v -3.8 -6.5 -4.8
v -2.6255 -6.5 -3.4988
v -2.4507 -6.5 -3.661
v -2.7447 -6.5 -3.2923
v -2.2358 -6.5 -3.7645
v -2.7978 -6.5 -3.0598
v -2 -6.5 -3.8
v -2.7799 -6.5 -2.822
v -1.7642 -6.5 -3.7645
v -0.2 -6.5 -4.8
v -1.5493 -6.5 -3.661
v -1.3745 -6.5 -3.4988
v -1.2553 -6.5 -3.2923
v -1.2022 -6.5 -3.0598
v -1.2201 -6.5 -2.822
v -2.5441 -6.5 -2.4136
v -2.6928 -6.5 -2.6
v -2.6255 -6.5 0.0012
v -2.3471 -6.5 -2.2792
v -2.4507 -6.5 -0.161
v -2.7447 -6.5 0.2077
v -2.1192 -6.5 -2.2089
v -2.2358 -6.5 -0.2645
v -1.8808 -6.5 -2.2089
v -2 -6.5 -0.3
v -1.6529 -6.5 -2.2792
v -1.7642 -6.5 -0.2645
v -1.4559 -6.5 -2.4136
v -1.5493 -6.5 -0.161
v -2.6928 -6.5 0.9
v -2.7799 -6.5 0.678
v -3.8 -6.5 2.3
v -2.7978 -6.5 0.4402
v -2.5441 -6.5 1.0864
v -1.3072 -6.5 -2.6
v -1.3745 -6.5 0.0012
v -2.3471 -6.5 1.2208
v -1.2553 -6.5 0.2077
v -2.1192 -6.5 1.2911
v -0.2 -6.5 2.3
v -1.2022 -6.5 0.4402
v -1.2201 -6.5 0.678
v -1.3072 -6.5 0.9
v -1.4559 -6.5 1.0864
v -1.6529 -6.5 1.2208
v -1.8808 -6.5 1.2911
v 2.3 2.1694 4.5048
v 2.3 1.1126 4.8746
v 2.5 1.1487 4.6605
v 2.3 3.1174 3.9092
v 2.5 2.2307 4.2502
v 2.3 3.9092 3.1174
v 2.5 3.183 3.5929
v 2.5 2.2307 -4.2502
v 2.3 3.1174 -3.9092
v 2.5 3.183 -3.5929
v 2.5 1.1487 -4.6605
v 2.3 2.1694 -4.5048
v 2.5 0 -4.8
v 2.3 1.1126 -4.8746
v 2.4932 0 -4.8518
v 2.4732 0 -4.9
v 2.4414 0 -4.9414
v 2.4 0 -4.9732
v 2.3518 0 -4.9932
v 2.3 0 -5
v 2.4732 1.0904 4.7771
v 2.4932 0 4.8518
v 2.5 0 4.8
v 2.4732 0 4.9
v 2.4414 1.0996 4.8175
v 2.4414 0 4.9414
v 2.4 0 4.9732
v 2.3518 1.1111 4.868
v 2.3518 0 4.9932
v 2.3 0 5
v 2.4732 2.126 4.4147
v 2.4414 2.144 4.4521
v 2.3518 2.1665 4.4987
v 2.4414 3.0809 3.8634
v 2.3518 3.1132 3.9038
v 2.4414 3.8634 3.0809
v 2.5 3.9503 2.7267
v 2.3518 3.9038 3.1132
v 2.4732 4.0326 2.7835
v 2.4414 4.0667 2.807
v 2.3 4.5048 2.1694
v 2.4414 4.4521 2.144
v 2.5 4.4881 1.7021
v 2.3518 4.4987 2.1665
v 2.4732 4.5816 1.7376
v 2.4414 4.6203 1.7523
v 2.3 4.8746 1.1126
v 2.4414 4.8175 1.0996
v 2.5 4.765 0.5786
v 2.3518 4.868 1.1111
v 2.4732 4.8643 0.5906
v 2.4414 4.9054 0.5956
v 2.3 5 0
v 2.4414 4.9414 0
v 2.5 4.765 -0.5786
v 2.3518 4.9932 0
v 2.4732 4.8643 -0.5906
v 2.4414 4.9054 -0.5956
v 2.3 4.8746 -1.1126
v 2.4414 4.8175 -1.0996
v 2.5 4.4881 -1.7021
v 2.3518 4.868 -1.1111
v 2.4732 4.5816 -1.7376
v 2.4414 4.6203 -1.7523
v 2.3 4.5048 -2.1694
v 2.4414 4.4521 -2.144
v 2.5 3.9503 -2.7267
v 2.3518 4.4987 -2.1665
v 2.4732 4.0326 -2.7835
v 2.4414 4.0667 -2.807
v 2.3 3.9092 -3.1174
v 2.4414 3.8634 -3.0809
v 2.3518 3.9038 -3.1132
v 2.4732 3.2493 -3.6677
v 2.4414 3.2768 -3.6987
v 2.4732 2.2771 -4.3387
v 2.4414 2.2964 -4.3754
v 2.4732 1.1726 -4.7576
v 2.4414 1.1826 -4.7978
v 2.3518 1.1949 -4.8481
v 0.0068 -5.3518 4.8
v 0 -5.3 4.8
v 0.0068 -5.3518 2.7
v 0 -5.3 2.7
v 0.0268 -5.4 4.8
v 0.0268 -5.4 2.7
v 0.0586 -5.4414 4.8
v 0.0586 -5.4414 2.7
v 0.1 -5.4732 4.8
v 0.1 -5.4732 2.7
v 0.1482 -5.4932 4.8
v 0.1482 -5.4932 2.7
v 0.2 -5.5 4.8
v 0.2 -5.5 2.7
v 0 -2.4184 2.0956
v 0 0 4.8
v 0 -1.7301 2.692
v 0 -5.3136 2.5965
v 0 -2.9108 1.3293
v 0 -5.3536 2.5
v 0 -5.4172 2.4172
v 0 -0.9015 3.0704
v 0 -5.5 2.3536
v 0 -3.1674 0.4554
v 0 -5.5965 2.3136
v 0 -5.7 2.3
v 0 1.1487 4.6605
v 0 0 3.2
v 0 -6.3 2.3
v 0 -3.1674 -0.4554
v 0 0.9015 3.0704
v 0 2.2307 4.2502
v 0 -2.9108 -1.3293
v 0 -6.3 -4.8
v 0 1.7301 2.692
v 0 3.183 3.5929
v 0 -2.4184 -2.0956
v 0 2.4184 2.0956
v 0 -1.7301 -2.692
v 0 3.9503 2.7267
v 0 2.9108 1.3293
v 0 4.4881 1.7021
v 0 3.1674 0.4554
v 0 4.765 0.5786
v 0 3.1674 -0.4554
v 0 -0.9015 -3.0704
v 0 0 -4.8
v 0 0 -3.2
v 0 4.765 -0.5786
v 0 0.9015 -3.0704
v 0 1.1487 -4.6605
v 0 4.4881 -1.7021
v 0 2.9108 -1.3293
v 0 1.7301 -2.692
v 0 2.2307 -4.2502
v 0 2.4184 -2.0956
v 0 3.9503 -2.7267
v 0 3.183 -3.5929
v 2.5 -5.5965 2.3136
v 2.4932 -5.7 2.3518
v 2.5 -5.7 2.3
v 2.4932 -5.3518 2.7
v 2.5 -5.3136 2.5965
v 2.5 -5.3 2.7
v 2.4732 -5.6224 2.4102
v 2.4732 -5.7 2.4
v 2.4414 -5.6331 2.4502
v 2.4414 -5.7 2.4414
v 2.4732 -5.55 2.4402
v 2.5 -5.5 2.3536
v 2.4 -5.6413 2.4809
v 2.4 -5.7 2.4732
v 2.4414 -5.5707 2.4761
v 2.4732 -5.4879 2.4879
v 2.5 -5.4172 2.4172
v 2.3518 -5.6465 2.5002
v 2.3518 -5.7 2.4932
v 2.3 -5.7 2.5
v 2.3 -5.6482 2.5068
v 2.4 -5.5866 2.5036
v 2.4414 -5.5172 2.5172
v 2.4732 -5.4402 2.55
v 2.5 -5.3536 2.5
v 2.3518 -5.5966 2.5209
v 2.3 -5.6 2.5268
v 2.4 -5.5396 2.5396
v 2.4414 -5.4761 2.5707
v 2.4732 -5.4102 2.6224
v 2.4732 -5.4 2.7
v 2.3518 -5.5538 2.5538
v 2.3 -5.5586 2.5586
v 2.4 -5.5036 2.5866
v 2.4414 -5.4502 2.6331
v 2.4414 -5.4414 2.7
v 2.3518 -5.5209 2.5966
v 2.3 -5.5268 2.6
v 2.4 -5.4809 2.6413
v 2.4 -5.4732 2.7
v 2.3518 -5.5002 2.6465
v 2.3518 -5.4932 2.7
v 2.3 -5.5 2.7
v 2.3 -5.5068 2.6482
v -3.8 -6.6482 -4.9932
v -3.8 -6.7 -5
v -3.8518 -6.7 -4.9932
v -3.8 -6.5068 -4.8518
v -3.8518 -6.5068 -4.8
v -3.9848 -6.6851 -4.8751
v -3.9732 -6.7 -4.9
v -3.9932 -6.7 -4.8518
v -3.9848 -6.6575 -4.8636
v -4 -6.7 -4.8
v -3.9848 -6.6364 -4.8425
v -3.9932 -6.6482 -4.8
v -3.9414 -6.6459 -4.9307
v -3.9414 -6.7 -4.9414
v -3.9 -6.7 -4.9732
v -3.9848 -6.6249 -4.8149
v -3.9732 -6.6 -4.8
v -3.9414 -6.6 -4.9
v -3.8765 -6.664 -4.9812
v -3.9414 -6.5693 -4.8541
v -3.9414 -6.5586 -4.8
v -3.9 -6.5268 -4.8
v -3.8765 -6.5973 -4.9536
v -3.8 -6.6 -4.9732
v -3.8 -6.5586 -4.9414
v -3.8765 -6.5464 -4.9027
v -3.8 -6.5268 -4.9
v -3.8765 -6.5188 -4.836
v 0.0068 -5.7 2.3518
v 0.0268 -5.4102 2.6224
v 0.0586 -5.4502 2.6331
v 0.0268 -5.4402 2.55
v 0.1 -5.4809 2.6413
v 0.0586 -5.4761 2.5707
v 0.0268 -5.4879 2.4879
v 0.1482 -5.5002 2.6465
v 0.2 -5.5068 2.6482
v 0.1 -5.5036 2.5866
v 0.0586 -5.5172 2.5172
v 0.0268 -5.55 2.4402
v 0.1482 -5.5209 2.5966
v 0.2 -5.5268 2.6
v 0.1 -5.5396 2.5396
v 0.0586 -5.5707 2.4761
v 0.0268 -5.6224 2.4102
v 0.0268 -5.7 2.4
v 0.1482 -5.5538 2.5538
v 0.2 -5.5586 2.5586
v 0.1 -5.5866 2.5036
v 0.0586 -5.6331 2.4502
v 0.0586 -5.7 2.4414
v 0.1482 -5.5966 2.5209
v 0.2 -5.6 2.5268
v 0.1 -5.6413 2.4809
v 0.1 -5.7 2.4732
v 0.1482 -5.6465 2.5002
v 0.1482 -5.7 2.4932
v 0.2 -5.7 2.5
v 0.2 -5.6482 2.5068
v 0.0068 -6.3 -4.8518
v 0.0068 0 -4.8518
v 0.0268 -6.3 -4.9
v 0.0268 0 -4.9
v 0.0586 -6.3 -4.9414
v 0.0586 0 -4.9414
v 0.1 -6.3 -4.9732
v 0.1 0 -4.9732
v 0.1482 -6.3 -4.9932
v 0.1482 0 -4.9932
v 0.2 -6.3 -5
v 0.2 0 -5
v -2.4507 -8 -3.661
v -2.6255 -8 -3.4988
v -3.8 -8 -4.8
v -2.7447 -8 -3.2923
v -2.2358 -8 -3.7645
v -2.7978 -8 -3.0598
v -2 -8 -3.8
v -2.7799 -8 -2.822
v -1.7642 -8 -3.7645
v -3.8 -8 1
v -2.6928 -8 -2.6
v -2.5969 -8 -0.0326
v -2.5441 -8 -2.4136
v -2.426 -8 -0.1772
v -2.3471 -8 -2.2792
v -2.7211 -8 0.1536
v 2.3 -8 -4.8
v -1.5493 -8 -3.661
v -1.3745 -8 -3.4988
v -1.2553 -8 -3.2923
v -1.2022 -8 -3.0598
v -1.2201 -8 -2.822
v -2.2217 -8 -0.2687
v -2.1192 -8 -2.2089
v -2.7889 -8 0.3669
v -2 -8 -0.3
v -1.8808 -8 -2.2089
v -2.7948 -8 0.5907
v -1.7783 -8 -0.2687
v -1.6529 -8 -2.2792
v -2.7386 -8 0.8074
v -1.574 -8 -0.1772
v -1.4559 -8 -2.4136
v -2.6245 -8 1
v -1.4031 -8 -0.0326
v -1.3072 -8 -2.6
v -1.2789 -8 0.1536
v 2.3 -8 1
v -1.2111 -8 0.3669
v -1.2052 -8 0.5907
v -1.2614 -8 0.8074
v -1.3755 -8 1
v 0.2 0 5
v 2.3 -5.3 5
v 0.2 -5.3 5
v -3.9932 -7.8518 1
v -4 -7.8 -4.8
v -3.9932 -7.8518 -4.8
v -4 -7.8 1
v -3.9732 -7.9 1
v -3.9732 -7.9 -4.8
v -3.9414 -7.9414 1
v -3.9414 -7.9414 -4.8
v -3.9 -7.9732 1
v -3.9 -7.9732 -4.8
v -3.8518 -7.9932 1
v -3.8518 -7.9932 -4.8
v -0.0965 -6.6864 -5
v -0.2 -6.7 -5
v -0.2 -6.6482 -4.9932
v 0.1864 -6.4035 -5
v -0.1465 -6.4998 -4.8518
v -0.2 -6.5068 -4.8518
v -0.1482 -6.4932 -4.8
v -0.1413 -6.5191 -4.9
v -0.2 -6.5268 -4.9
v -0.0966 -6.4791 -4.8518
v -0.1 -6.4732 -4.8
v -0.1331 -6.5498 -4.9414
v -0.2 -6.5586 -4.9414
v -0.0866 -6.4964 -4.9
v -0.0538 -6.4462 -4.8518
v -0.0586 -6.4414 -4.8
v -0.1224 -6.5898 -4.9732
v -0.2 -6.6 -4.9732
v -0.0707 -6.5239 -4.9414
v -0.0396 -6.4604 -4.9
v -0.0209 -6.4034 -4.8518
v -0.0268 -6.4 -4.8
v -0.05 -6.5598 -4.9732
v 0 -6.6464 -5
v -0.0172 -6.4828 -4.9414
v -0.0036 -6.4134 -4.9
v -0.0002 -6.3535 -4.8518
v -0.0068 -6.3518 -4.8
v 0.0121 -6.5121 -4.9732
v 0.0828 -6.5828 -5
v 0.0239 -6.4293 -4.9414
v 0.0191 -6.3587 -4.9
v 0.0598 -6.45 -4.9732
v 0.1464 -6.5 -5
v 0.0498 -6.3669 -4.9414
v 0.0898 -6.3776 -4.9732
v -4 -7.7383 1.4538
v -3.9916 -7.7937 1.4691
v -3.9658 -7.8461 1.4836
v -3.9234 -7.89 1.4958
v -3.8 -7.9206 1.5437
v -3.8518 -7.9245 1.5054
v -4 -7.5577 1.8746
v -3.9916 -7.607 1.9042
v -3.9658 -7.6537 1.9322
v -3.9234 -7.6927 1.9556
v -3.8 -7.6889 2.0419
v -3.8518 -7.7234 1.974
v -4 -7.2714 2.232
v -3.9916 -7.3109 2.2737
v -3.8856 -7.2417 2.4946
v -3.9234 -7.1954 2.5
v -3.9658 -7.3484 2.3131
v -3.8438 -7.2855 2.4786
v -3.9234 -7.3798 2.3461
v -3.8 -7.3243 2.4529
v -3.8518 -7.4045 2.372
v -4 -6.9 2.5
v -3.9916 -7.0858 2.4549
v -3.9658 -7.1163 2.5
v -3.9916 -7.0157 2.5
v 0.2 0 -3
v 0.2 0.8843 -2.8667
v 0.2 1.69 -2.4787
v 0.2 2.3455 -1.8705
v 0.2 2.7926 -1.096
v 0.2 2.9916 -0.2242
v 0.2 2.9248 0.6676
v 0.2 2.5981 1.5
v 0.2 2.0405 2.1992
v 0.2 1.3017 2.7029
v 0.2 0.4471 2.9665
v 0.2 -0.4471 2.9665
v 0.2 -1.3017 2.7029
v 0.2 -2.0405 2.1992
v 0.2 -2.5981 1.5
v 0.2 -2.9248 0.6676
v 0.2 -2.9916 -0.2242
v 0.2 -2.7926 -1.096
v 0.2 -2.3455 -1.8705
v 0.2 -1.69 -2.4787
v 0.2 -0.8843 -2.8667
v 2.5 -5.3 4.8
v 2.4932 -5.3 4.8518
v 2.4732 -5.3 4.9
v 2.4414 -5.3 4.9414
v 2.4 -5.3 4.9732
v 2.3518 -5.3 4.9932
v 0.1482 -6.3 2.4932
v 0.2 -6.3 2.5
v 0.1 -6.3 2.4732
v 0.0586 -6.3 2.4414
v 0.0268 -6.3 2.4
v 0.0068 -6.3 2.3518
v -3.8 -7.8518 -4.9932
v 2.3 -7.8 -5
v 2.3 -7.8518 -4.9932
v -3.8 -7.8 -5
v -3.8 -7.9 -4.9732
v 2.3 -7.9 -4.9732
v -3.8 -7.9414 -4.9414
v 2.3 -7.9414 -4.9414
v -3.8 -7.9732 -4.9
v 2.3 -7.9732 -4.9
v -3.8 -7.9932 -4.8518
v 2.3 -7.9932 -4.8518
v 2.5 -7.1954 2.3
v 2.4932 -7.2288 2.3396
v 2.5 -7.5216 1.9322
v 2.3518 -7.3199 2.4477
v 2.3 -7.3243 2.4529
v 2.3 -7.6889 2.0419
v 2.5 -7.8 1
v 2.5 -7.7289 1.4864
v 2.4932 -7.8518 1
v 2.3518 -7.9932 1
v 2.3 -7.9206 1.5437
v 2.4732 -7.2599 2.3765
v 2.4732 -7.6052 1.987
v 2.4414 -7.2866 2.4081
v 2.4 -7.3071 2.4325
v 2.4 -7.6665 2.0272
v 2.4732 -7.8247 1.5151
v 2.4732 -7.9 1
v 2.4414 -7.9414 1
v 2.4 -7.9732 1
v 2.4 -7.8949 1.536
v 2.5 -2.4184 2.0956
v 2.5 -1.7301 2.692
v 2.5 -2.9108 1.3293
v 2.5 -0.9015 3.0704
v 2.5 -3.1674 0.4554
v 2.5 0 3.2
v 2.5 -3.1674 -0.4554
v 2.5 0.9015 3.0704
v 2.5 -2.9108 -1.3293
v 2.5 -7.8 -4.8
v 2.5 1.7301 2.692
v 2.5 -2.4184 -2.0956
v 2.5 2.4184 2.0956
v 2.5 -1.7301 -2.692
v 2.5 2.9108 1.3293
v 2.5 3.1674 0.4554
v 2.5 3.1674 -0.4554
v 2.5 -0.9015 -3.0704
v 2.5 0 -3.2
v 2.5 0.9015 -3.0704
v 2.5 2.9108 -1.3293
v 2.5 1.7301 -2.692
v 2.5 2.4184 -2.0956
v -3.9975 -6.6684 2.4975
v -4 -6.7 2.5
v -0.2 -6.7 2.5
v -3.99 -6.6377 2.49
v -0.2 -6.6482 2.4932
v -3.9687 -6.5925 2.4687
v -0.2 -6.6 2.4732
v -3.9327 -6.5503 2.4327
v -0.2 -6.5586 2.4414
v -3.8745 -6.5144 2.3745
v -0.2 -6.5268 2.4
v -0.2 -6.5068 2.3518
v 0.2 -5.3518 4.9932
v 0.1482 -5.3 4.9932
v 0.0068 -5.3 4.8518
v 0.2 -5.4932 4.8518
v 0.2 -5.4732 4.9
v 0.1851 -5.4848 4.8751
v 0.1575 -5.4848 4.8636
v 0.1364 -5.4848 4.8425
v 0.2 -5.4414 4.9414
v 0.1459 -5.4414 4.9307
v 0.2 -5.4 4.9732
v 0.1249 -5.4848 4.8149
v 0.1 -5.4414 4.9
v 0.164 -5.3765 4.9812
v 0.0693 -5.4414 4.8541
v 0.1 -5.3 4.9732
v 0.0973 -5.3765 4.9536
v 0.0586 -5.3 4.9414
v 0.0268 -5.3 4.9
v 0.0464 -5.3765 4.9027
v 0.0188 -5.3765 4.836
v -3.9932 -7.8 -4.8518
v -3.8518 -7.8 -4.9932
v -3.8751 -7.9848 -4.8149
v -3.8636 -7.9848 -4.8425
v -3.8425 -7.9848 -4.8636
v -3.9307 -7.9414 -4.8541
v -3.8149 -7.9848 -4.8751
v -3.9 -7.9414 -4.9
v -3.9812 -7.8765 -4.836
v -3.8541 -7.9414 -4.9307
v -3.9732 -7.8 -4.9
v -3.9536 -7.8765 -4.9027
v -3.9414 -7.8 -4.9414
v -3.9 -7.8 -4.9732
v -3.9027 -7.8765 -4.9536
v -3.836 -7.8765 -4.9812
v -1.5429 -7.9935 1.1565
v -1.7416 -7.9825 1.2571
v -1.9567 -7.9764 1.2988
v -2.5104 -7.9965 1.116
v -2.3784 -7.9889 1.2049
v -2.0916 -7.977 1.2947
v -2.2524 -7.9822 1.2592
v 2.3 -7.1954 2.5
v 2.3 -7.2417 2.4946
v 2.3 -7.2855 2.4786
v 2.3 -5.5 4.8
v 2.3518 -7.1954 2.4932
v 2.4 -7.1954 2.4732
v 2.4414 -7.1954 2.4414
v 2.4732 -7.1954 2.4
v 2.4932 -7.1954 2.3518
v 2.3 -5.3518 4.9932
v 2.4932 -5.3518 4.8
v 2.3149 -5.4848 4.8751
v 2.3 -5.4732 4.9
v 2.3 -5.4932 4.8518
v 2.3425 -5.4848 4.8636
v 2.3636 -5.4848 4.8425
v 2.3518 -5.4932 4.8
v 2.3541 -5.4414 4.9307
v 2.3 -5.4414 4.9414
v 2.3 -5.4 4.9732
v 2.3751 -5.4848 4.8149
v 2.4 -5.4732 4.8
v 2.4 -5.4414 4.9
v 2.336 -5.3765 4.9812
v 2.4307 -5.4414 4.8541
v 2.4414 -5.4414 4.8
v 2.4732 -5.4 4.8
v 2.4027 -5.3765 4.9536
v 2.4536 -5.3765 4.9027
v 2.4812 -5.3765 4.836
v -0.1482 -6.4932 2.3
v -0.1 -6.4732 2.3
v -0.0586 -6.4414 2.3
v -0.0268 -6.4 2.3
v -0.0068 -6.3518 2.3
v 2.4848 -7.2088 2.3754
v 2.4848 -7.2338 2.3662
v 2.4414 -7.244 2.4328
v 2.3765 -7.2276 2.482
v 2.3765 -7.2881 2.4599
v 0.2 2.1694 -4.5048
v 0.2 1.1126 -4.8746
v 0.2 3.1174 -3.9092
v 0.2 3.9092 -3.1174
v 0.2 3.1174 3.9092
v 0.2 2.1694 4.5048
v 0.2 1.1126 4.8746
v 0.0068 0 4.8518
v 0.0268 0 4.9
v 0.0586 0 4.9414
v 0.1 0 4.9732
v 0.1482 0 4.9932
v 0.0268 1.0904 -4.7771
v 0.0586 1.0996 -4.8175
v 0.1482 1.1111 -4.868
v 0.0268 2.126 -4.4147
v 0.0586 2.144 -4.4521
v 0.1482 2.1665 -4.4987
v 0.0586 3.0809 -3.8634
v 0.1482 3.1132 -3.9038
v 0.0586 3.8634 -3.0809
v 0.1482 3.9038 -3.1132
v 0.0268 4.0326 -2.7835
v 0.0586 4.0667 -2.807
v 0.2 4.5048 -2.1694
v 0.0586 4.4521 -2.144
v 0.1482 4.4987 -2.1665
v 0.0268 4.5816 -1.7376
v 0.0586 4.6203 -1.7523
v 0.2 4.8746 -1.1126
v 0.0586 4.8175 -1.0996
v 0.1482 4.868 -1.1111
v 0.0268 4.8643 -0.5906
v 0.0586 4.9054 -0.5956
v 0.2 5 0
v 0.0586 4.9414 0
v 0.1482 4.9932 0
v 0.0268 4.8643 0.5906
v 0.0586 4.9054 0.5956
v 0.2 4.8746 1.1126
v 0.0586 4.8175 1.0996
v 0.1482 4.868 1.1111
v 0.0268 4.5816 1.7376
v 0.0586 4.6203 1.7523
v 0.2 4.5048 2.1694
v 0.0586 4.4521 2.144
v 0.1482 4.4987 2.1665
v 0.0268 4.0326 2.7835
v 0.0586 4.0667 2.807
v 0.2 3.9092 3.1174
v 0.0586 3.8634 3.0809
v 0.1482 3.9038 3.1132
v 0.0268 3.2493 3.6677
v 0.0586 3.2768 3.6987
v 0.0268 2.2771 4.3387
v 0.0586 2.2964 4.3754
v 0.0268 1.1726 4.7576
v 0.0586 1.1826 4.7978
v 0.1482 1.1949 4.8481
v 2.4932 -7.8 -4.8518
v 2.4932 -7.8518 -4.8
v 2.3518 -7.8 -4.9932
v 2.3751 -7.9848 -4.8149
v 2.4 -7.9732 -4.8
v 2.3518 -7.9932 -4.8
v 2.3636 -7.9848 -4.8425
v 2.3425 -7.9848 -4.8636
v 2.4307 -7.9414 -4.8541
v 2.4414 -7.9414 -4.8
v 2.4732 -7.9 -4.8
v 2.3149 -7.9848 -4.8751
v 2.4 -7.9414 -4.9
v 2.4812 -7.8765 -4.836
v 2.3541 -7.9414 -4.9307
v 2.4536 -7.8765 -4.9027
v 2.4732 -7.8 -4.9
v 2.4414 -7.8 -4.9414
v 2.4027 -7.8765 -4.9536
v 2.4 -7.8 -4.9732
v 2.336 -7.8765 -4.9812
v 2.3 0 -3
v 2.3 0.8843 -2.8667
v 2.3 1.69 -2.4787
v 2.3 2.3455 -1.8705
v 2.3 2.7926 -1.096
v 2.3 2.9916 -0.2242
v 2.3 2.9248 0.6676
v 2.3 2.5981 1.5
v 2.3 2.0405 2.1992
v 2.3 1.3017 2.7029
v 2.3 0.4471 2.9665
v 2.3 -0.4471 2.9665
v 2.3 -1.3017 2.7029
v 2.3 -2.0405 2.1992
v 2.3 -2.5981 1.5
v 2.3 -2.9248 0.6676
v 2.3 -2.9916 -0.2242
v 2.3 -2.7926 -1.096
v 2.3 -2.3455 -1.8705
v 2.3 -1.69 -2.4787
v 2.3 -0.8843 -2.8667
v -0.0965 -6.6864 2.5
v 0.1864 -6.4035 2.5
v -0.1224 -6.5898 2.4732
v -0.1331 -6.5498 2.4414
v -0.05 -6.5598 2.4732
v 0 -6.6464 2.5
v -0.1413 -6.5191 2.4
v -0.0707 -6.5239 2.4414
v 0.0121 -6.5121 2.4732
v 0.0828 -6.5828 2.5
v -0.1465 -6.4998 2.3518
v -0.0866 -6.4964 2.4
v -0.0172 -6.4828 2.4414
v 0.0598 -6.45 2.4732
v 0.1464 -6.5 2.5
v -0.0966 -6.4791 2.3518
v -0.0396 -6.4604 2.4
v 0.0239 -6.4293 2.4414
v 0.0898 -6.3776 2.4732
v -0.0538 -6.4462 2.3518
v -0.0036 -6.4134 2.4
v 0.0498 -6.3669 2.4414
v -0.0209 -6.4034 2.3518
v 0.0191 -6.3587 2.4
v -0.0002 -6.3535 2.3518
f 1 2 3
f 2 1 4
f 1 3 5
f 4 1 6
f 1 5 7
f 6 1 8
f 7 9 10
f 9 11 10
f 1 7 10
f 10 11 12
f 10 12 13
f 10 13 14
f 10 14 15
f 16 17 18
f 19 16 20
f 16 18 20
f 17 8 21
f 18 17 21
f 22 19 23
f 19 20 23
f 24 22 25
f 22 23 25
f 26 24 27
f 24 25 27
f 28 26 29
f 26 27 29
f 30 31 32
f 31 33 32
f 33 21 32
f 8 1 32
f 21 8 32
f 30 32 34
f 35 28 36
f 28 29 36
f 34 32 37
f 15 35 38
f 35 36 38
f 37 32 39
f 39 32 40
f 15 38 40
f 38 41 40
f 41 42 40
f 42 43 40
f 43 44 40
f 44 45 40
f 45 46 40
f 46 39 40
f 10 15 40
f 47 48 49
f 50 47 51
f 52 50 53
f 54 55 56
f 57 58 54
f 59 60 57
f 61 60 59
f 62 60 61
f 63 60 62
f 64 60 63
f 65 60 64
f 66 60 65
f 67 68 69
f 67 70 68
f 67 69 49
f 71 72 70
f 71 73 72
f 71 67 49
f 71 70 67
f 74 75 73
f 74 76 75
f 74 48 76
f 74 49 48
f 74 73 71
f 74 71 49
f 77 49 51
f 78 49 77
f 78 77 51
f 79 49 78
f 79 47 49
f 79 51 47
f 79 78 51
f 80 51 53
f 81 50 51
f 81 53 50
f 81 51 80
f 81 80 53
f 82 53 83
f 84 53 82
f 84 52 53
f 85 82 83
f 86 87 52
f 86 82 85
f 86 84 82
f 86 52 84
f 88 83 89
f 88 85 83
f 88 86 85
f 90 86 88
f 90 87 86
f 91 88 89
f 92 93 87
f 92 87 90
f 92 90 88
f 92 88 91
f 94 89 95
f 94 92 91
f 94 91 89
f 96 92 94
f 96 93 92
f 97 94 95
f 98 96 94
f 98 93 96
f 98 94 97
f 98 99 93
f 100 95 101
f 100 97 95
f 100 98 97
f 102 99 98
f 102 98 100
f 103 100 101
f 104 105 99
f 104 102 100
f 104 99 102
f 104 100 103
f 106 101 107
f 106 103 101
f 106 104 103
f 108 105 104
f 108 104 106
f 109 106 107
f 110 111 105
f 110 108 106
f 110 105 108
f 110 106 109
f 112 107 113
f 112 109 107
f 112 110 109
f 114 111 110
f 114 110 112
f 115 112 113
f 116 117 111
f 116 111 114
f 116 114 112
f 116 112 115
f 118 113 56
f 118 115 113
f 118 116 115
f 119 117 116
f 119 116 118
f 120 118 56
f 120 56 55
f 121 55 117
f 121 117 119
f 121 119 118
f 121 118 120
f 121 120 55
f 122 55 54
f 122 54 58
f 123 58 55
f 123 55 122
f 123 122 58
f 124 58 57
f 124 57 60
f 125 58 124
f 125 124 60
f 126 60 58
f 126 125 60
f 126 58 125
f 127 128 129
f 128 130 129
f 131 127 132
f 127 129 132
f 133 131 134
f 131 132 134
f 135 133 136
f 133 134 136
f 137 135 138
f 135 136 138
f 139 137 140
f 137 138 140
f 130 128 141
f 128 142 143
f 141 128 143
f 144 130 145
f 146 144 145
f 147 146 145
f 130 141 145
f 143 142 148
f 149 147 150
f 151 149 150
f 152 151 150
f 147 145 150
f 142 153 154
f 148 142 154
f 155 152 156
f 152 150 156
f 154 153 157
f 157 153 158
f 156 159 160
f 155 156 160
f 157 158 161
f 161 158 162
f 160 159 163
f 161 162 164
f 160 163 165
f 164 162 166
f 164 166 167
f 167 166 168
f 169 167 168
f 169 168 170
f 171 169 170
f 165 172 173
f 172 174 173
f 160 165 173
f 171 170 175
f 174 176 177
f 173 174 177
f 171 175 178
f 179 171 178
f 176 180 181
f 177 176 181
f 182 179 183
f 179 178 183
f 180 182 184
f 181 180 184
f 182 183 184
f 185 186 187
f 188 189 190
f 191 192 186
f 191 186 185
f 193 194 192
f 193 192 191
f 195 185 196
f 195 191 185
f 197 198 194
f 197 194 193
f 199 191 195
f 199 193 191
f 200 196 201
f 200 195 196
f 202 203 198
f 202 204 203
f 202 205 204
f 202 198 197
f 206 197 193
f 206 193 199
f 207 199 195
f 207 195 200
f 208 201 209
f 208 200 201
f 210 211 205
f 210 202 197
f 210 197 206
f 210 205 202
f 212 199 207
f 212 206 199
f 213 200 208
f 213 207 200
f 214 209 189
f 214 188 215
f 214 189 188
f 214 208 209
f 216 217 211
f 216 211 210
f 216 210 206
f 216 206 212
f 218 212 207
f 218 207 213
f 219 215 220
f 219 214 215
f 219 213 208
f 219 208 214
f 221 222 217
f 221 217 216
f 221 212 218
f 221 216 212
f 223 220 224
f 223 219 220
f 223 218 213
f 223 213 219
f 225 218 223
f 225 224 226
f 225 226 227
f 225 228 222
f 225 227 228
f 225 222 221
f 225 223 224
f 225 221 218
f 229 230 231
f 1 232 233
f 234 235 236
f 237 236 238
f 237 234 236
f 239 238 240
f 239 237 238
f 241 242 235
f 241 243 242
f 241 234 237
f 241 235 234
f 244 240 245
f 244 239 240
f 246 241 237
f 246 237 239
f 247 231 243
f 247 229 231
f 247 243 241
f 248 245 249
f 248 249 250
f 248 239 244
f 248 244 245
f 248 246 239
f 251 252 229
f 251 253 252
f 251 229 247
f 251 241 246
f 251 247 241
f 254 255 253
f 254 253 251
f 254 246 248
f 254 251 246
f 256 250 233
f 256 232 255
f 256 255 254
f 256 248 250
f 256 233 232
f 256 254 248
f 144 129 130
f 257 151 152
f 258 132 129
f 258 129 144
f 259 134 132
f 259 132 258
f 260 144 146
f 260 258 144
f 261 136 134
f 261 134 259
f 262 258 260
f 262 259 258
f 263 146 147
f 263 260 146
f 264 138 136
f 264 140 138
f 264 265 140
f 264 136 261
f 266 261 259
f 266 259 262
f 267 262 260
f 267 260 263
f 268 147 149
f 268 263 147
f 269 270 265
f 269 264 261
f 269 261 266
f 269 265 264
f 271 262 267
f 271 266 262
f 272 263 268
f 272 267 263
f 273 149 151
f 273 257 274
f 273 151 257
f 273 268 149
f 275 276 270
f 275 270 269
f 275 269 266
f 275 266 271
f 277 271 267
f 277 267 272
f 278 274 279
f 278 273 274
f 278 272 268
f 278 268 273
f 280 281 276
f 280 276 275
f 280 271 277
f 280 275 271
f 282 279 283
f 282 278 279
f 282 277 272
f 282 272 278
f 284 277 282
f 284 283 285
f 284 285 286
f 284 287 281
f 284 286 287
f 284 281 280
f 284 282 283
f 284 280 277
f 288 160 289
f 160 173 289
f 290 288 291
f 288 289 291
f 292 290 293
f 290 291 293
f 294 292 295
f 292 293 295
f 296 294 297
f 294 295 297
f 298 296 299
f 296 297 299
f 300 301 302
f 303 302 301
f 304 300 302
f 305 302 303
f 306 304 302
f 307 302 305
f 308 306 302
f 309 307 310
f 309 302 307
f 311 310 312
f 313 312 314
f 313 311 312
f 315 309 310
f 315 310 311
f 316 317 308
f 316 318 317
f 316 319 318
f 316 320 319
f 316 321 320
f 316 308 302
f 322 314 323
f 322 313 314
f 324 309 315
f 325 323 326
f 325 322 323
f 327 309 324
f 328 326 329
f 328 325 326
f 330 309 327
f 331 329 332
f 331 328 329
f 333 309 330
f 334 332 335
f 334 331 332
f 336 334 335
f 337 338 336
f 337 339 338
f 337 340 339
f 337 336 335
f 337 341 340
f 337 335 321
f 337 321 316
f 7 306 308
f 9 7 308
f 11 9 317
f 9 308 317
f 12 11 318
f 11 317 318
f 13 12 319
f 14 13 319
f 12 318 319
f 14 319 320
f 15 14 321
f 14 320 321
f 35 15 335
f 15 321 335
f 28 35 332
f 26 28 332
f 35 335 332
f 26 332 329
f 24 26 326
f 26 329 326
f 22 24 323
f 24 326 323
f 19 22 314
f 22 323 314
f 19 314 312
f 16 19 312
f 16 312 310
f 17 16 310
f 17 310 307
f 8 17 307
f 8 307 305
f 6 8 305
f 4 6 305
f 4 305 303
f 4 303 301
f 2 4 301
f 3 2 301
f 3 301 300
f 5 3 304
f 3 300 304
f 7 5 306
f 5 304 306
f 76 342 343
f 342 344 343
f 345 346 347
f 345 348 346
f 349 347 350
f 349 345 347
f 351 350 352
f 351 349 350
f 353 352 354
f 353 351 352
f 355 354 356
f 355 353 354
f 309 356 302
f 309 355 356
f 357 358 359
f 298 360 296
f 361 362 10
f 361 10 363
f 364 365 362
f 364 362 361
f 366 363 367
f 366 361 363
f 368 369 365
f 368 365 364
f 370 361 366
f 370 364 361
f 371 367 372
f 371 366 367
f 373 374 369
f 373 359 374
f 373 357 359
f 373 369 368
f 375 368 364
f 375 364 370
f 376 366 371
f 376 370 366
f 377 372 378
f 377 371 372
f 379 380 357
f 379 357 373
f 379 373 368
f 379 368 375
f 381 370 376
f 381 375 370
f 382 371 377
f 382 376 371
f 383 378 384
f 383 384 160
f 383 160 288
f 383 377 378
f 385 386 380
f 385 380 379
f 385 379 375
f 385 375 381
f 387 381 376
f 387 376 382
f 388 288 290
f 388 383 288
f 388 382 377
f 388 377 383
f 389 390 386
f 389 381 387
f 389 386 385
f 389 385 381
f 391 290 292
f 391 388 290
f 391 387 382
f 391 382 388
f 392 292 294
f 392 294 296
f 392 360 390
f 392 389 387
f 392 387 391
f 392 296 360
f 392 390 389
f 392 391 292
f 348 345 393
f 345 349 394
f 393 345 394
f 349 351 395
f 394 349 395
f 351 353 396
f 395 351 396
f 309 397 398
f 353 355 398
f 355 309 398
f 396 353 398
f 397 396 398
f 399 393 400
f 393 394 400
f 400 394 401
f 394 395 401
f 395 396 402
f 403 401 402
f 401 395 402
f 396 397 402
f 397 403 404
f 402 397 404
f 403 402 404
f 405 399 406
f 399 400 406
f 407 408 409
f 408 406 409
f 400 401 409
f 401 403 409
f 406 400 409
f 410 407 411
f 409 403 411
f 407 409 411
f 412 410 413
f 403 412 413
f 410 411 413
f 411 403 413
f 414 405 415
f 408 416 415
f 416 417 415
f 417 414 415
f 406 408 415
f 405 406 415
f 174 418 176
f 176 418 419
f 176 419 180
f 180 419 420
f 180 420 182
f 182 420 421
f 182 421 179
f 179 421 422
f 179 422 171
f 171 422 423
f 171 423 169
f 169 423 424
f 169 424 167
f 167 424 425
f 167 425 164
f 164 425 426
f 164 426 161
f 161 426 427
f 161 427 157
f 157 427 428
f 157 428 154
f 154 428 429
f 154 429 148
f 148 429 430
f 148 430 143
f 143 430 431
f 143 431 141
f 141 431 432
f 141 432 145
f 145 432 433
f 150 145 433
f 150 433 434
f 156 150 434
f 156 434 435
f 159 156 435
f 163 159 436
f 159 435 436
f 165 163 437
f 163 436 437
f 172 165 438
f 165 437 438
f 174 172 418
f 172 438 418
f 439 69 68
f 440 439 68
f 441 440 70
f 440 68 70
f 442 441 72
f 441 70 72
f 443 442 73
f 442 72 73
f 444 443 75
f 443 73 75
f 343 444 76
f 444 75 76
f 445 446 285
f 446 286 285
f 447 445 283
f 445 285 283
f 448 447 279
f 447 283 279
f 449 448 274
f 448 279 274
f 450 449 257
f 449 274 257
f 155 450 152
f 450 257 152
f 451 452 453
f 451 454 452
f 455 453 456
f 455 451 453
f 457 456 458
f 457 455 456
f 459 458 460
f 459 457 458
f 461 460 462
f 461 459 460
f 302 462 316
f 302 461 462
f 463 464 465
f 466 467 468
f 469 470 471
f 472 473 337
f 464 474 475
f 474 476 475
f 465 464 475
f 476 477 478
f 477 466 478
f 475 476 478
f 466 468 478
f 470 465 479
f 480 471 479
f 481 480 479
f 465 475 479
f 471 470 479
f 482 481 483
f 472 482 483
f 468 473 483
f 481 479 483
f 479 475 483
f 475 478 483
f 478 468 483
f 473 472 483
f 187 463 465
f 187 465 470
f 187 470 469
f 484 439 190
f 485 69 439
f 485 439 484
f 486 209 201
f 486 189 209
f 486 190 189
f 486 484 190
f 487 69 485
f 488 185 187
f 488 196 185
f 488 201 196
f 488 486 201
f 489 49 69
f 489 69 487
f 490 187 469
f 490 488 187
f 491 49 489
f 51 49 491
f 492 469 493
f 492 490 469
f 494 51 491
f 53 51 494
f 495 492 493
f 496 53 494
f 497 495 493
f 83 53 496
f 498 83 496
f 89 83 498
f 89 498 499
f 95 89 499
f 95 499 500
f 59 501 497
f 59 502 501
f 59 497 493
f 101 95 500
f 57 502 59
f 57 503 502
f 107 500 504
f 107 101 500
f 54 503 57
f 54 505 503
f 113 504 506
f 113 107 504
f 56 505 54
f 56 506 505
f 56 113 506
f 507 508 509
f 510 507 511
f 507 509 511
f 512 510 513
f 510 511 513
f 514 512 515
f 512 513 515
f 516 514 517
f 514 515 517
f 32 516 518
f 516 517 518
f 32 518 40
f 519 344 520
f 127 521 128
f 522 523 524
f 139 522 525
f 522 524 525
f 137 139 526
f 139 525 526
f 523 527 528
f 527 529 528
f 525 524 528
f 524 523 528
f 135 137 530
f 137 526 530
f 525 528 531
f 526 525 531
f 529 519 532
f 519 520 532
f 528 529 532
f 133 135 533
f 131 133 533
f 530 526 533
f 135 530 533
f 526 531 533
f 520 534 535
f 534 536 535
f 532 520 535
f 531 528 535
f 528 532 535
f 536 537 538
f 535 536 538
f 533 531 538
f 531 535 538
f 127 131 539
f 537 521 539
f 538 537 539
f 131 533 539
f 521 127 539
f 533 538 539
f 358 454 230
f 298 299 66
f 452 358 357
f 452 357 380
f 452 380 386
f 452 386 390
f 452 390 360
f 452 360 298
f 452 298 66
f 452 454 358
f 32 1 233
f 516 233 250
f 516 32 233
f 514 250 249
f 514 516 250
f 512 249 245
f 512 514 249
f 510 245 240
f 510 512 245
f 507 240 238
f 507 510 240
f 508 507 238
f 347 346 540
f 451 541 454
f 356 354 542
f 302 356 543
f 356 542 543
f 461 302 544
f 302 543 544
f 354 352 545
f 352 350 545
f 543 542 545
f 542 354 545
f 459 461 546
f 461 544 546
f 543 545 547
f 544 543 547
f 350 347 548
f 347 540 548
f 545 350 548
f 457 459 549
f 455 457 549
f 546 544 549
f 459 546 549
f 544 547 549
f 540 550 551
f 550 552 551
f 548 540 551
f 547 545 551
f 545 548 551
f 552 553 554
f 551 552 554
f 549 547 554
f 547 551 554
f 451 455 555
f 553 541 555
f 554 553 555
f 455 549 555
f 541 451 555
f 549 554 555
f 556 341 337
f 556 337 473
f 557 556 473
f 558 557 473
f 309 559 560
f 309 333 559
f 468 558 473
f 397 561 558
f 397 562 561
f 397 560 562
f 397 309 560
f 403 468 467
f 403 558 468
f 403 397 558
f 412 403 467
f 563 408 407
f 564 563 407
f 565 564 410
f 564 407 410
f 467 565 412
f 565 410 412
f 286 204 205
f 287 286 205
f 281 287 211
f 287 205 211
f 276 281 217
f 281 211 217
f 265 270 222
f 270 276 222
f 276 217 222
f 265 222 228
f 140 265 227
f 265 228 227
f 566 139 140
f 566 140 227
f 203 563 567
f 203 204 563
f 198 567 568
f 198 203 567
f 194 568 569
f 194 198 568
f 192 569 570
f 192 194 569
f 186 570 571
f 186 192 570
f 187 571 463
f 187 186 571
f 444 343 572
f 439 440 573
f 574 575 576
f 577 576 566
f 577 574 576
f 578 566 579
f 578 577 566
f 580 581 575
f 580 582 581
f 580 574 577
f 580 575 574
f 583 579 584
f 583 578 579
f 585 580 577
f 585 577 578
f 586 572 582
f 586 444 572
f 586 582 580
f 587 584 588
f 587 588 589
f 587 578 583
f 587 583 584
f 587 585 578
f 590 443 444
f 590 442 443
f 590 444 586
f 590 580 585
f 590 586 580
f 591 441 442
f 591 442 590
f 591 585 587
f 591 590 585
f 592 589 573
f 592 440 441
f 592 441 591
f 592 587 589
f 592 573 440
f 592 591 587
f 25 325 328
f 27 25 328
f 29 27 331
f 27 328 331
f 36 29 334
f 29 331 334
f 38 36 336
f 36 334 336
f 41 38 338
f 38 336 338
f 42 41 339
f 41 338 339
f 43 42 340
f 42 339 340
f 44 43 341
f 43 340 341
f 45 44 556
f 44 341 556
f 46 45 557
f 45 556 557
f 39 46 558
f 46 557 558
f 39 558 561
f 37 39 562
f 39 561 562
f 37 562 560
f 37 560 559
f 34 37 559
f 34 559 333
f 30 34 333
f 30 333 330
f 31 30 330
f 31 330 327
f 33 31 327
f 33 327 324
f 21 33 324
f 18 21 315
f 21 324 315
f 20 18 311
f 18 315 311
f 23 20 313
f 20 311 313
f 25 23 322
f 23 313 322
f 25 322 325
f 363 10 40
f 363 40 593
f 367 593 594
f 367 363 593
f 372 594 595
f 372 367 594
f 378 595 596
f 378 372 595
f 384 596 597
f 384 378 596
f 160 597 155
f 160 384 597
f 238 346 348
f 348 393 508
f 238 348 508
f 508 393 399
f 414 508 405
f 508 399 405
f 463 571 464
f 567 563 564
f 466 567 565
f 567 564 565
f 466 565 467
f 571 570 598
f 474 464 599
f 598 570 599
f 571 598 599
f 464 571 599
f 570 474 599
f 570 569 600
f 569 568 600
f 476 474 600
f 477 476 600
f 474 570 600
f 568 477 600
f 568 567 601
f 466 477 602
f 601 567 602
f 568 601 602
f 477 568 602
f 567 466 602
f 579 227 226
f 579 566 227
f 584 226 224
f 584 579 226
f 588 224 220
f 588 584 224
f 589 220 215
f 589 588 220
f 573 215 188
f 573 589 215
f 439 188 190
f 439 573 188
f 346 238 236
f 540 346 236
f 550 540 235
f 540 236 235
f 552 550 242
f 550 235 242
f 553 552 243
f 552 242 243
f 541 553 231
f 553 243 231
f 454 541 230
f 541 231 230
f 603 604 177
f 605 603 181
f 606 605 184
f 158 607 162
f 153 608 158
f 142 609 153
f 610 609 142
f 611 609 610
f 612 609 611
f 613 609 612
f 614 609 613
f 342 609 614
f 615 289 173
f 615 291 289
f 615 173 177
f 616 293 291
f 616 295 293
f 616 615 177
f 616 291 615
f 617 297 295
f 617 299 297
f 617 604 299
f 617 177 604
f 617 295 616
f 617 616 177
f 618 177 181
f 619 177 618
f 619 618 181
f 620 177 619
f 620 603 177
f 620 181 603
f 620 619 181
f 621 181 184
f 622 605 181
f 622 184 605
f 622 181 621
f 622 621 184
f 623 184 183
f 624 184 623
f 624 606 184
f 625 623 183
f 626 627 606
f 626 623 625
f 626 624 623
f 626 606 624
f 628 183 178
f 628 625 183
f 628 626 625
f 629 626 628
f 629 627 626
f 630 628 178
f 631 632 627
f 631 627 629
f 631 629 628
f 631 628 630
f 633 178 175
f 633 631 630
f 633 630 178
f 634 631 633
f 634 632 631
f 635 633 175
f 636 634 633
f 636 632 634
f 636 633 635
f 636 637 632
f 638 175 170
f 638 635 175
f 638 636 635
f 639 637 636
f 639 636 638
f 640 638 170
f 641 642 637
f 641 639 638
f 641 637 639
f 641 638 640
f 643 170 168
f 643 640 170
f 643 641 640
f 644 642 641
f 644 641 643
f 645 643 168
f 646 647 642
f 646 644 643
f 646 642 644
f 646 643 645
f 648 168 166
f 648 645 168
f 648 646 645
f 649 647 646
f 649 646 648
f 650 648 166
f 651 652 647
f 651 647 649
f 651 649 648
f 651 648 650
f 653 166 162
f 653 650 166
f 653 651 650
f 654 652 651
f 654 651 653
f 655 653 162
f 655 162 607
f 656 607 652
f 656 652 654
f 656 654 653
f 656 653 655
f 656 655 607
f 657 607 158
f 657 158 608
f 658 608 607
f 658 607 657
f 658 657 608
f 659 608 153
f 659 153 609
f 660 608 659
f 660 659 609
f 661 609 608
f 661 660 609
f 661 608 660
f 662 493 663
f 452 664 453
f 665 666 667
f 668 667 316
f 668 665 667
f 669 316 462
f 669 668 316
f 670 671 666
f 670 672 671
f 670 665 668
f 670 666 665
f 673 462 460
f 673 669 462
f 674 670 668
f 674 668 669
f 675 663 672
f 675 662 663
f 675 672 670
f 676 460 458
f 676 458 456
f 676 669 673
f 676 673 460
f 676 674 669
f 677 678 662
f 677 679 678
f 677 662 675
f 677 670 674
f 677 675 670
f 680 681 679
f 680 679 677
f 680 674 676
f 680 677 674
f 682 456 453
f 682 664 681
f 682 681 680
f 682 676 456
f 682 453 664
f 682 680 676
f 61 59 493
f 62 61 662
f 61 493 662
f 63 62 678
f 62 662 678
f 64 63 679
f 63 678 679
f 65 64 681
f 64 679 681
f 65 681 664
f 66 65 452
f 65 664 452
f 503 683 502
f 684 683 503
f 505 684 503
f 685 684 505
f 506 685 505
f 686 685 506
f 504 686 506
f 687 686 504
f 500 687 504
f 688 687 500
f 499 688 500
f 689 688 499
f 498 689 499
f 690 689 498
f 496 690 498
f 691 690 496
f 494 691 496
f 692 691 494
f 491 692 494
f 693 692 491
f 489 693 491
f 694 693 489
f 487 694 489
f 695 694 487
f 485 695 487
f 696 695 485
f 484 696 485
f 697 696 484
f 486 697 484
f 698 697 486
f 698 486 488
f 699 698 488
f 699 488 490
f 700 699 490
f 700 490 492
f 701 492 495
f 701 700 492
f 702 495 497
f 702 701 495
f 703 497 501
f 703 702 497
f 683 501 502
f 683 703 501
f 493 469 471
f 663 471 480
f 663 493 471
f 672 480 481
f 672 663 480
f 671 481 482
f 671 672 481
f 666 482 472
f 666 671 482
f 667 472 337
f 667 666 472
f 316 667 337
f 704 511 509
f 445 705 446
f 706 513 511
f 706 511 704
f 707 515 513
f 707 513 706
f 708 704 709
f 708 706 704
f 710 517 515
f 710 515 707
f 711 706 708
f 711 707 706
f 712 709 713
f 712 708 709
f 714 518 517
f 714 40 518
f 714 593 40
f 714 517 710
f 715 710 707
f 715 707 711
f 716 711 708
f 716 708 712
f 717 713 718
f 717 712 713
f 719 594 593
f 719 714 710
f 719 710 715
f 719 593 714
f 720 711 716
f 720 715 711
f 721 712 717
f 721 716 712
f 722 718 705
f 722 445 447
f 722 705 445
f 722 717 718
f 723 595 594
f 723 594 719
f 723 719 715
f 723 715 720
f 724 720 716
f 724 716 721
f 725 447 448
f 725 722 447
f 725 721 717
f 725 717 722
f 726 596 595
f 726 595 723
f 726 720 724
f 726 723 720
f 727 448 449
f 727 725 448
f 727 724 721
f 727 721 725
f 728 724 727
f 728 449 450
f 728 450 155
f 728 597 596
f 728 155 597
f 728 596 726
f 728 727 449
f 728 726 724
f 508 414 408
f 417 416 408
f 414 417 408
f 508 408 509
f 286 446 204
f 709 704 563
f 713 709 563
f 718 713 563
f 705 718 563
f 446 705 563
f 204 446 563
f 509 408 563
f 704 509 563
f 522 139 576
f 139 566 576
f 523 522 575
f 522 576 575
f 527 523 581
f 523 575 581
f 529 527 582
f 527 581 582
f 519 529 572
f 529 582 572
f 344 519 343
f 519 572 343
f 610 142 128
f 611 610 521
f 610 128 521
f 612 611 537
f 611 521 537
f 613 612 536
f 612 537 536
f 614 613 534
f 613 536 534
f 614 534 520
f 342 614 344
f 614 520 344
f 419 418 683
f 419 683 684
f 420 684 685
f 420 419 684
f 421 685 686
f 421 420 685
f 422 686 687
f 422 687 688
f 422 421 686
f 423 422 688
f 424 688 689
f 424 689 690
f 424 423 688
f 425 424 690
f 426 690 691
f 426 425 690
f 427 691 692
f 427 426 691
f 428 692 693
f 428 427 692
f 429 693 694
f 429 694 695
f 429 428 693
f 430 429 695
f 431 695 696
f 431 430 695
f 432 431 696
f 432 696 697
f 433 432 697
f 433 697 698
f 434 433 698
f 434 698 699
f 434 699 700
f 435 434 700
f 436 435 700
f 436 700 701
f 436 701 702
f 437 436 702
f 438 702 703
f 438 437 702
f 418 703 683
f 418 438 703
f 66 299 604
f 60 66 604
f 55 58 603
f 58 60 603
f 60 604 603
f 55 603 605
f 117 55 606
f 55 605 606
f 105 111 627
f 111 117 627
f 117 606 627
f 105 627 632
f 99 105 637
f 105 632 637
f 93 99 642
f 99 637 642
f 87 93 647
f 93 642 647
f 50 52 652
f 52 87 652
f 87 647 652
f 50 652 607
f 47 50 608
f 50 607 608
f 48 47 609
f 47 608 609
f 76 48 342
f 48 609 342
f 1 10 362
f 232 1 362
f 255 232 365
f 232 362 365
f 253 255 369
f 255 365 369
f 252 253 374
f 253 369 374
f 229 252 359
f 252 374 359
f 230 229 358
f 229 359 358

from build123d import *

# Parameters (mm, degrees)
SKETCH_1_R          = 3
EXTRUDE_1_DEPTH     = 2.5
SKETCH_2_W          = 6.5
SKETCH_2_H          = 10
SKETCH_2_R          = 0.8
EXTRUDE_2_DEPTH     = 1.5
SKETCH_5_W          = 6.5
SKETCH_5_H          = 2.5
CUT_EXTRUDE_1_DEPTH = 2.5
CUT_EXTRUDE_2_REACH = 13.456
FILLET_1_R          = 0.2
FILLET_2_R          = 0.2
CHAMFER_1_SIZE      = 0.2


with BuildPart() as part:
    # 草图1 → 凸台-拉伸1 (new body)
    with BuildSketch(Plane(origin=(0, 0, 0), x_dir=(0, 0, -1), z_dir=(1, 0, 0))):
        with BuildLine():
            Line((-5, 0), (-5, -8))
            Line((-5, -8), (5, -8))
            Line((5, -8), (5, 0))
            ThreePointArc((5, 0), (0, 5), (-5, 0))
        make_face()
        Circle(SKETCH_1_R, mode=Mode.SUBTRACT)
    extrude(amount=EXTRUDE_1_DEPTH)

    # 草图2 → 凸台-拉伸2 (add)
    with BuildSketch(Plane.XZ.offset(8)):
        with Locations((-0.75, 0)):
            Rectangle(SKETCH_2_W, SKETCH_2_H)
        with Locations(Location((-2, 0.5, 0), (0, 0, 270))):
            Circle(SKETCH_2_R, mode=Mode.SUBTRACT)
        with Locations(Location((-2, -3, 0), (0, 0, 270))):
            Circle(SKETCH_2_R, mode=Mode.SUBTRACT)
    extrude(amount=-EXTRUDE_2_DEPTH)

    # 草图5 → 切除-拉伸1 (cut)
    with BuildSketch(Plane.XZ.offset(8)):
        with Locations((-0.75, 3.75)):
            Rectangle(SKETCH_5_W, SKETCH_5_H)
    extrude(amount=-CUT_EXTRUDE_1_DEPTH, mode=Mode.SUBTRACT)

    # 草图6 → 切除-拉伸2 (cut, up to next)
    with BuildSketch(Plane.ZY.offset(4), mode=Mode.PRIVATE) as cut_extrude_2_sk1:
        with BuildLine():
            Line((2.897366596, -6), (3.27705392, -6))
            Line((3.27705392, -6), (3.27705392, -8.325127743))
            Line((3.27705392, -8.325127743), (1, -8.325127743))
            Line((1, -8.325127743), (1, -8))
            ThreePointArc((1, -8), (2.378404875, -7.407669683), (2.897366596, -6))
        make_face()
    cut_extrude_2_tool1 = extrude(cut_extrude_2_sk1.sketch, amount=-CUT_EXTRUDE_2_REACH, mode=Mode.PRIVATE) & part.part
    add(cut_extrude_2_tool1.solids().sort_by_distance((-4, -7.575754, 2.569334))[0], mode=Mode.SUBTRACT)

    # 圆角1
    fillet_1_edges = [part.edges().sort_by_distance(p)[0] for p in [
        (0, -6.5, -1.25),
    ]]
    fillet(fillet_1_edges, radius=FILLET_1_R)

    # 圆角2
    fillet_2_edges = [part.edges().sort_by_distance(p)[0] for p in [
        (2.5, -4, -5),
        (-2.1, -6.5, -5),
        (-4, -7.25, -5),
        (2.5, 5, 0),
        (-4, -6.5, -1.25),
        (1.25, -5.5, 5),
        (-2.1, -6.5, 2.5),
        (1.25, -5.5, 2.5),
        (2.5, -6.383095189, 2.5),
        (2.5, -5.5, 3.75),
        (0, -5.5, 3.75),
        (0, -2.75, 5),
        (0, 5, 0),
        (-4, -8, -2),
        (2.5, -8, -2),
        (-0.75, -7.266190379, 2.5),
        (2.5, -7.806716397, 1.834936608),
        (-4, -7.806716397, 1.834936608),
        (2.5, -2.75, 5),
        (-0.75, -8, -5),
        (0, -5.9, 2.5),
        (0, -3.15, -5),
        (-0.058578644, -6.441421356, -5),
        (-0.058578644, -6.441421356, 2.5),
    ]]
    fillet(fillet_2_edges, radius=FILLET_2_R)

    # 倒角1
    chamfer_1_edges = [part.edges().sort_by_distance(p)[0] for p in [
        (0, 0, 3),
        (2.5, 0, 3),
    ]]
    chamfer(chamfer_1_edges, length=CHAMFER_1_SIZE)


solid = part.part
